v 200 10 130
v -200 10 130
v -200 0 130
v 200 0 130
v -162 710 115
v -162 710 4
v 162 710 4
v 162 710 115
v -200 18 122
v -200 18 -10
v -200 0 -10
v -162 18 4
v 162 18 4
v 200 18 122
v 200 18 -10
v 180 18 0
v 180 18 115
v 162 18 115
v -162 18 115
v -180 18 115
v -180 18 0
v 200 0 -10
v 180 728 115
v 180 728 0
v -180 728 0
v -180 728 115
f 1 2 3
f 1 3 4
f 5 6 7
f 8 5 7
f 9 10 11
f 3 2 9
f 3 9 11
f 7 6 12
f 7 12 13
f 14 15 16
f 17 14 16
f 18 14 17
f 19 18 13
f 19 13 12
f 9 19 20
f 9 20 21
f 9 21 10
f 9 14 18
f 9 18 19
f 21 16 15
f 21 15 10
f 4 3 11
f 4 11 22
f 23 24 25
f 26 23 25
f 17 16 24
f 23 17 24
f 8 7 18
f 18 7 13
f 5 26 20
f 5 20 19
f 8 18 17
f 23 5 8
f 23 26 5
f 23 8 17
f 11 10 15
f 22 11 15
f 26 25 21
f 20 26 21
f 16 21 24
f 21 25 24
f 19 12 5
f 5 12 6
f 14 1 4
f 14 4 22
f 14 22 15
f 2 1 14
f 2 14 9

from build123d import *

# Parameters (mm, degrees)
F0_W          = 324
F0_H          = 18
F1_DEPTH      = 115
F2_DEPTH      = 130
F2_DEPTH_BACK = 10
F3_SIZE       = 8
F0_H_2        = 692
F4_DEPTH      = 4


with BuildPart() as f1:
    # F0 (on Top) → F1 (new body)
    with BuildSketch(Plane.XY):
        Polygon((162, 710), (162, 18), (180, 18), (180, 728), (162, 728), align=None)
        with Locations((0, 719)):
            Rectangle(F0_W, F0_H)
        Polygon((-180, 728), (-180, 18), (-162, 18), (-162, 710), (-162, 728), align=None)
    extrude(amount=F1_DEPTH)

    # F0 (on Top) → F2 (join, two sides)
    with BuildSketch(Plane.XY) as f2_sk:
        Polygon((-162, 18), (-180, 18), (-200, 18), (-200, 0), (200, 0), (200, 18), (180, 18), (162, 18), align=None)
    extrude(amount=F2_DEPTH)
    extrude(f2_sk.sketch, amount=-F2_DEPTH_BACK)

    # F3
    f3_edges = [f1.edges().sort_by_distance(p)[0] for p in [
        (0, 18, 130),
    ]]
    chamfer(f3_edges, length=F3_SIZE)

    # F0 (on Top) → F4 (join)
    with BuildSketch(Plane.XY):
        with Locations((0, 364)):
            Rectangle(F0_W, F0_H_2)
    extrude(amount=F4_DEPTH)


solid = f1.part
